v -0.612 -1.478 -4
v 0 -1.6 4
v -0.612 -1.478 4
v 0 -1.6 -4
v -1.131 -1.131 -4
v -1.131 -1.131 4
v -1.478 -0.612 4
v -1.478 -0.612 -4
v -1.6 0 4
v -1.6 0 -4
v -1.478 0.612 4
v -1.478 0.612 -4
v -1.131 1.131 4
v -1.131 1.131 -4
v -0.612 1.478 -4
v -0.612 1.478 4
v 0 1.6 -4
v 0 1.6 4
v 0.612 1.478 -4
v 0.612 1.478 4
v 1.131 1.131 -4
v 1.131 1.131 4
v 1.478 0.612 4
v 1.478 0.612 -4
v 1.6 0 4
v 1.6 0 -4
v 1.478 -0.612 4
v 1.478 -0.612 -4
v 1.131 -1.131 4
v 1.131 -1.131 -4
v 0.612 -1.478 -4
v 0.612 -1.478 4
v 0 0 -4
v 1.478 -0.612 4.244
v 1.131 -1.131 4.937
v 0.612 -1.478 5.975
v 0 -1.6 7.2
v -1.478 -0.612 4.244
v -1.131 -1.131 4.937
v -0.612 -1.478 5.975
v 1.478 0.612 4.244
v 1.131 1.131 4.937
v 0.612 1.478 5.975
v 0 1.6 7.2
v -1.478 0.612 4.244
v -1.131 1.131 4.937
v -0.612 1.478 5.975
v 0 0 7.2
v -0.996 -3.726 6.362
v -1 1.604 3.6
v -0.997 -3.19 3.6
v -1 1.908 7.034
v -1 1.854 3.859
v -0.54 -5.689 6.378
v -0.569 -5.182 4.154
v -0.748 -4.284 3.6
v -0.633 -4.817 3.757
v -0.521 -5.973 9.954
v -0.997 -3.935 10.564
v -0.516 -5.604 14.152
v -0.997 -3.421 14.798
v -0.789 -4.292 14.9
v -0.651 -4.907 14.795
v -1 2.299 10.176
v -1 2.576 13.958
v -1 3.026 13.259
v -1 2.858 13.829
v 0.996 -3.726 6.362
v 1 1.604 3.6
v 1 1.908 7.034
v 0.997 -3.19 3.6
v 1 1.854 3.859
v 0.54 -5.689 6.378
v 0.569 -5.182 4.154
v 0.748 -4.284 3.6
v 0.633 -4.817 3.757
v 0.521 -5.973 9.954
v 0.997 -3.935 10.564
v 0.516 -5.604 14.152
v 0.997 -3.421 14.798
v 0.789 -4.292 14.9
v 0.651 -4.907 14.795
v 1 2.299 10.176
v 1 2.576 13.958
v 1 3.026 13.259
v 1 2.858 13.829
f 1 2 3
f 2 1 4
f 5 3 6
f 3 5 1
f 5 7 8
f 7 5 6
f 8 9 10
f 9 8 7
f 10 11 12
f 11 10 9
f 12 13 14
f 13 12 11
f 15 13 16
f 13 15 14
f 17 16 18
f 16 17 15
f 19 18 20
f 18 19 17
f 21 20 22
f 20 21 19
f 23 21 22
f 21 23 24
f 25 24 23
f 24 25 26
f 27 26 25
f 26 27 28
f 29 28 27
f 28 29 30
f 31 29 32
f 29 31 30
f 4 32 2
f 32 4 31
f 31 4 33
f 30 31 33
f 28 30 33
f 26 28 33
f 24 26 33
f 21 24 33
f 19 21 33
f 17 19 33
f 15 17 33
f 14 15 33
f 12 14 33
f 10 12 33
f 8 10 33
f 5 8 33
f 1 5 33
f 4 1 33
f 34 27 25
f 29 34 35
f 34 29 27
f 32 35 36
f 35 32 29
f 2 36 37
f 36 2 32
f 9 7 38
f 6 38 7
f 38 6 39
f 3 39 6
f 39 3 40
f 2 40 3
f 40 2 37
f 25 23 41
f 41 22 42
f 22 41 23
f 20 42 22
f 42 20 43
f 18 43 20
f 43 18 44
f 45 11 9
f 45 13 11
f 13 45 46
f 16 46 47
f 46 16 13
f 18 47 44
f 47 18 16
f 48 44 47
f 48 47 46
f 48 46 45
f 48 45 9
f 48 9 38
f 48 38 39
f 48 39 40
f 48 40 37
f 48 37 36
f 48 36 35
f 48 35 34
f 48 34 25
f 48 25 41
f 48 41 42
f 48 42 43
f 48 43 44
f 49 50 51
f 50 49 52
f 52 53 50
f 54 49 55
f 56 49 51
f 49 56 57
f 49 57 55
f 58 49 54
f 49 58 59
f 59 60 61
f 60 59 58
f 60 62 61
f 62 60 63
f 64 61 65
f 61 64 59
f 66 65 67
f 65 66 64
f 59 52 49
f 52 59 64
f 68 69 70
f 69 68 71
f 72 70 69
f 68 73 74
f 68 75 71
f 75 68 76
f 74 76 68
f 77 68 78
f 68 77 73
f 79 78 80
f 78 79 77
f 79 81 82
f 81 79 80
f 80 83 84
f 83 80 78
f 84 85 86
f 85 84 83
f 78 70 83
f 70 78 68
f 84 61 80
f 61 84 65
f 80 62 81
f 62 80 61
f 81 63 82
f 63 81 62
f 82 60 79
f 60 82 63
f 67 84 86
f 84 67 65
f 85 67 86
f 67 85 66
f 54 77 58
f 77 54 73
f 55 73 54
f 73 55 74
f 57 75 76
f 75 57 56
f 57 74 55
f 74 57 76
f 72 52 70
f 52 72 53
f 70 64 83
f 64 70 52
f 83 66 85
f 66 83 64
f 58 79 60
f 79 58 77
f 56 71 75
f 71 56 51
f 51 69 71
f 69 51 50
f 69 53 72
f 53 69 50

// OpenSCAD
// file: ../p/4-4edge.scad
use <../lib.scad>
function ldraw_lib__4_4edge() = [
// 0 Circle 1.0
// 0 Name: 4-4edge.dat
// 0 Author: James Jessiman
// 0 !LDRAW_ORG Primitive UPDATE 2017-01
// 0 !LICENSE Licensed under CC BY 2.0 and CC BY 4.0 : see CAreadme.txt
// 
// 0 BFC CERTIFY CCW
  [0,"BFC","CERTIFY"],
  [0,"BFC","CCW"],
// 
// 0 !HISTORY 1998-12-15 [PTadmin] Official Update 1998-10
// 0 !HISTORY 2005-12-28 [PTadmin] Official Update 2005-01
// 0 !HISTORY 2007-06-24 [PTadmin] Header formatted for Contributor Agreement
// 0 !HISTORY 2008-07-01 [PTadmin] Official Update 2008-01
// 0 !HISTORY 2017-01-15 [Steffen] BFCed
// 0 !HISTORY 2017-12-30 [PTadmin] Official Update 2017-01
// 
// 
// 2 24 1 0 0 0.9239 0 0.3827
  [2,24,1,0,0,0.9239,0,0.3827],
// 2 24 0.9239 0 0.3827 0.7071 0 0.7071
  [2,24,0.9239,0,0.3827,0.7071,0,0.7071],
// 2 24 0.7071 0 0.7071 0.3827 0 0.9239
  [2,24,0.7071,0,0.7071,0.3827,0,0.9239],
// 2 24 0.3827 0 0.9239 0 0 1
  [2,24,0.3827,0,0.9239,0,0,1],
// 2 24 0 0 1 -0.3827 0 0.9239
  [2,24,0,0,1,-0.3827,0,0.9239],
// 2 24 -0.3827 0 0.9239 -0.7071 0 0.7071
  [2,24,-0.3827,0,0.9239,-0.7071,0,0.7071],
// 2 24 -0.7071 0 0.7071 -0.9239 0 0.3827
  [2,24,-0.7071,0,0.7071,-0.9239,0,0.3827],
// 2 24 -0.9239 0 0.3827 -1 0 -0
  [2,24,-0.9239,0,0.3827,-1,0,-0],
// 2 24 -1 0 -0 -0.9239 0 -0.3827
  [2,24,-1,0,-0,-0.9239,0,-0.3827],
// 2 24 -0.9239 0 -0.3827 -0.7071 0 -0.7071
  [2,24,-0.9239,0,-0.3827,-0.7071,0,-0.7071],
// 2 24 -0.7071 0 -0.7071 -0.3827 0 -0.9239
  [2,24,-0.7071,0,-0.7071,-0.3827,0,-0.9239],
// 2 24 -0.3827 0 -0.9239 0 0 -1
  [2,24,-0.3827,0,-0.9239,0,0,-1],
// 2 24 0 0 -1 0.3827 0 -0.9239
  [2,24,0,0,-1,0.3827,0,-0.9239],
// 2 24 0.3827 0 -0.9239 0.7071 0 -0.7071
  [2,24,0.3827,0,-0.9239,0.7071,0,-0.7071],
// 2 24 0.7071 0 -0.7071 0.9239 0 -0.3827
  [2,24,0.7071,0,-0.7071,0.9239,0,-0.3827],
// 2 24 0.9239 0 -0.3827 1 0 0
  [2,24,0.9239,0,-0.3827,1,0,0],
];
makepoly(ldraw_lib__4_4edge(), line=0.2);
// file: ../p/4-4disc.scad
use <../lib.scad>
function ldraw_lib__4_4disc() = [
// 0 Disc 1.0
// 0 Name: 4-4disc.dat
// 0 Author: James Jessiman
// 0 !LDRAW_ORG Primitive UPDATE 2002-02
// 0 !LICENSE Licensed under CC BY 2.0 and CC BY 4.0 : see CAreadme.txt
// 
// 0 BFC CERTIFY CCW
  [0,"BFC","CERTIFY"],
  [0,"BFC","CCW"],
// 
// 0 !HISTORY 1998-12-15 [PTadmin] Official Update 1998-10
// 0 !HISTORY 2002-03-23 [sbliss] Added BFC statement
// 0 !HISTORY 2002-04-25 [PTadmin] Official Update 2002-02
// 0 !HISTORY 2007-06-24 [PTadmin] Header formatted for Contributor Agreement
// 0 !HISTORY 2008-07-01 [PTadmin] Official Update 2008-01
// 
// 
// 3 16 0 0 0 1 0 0 0.9239 0 0.3827
  [3,16,0,0,0,1,0,0,0.9239,0,0.3827],
// 3 16 0 0 0 0.9239 0 0.3827 0.7071 0 0.7071
  [3,16,0,0,0,0.9239,0,0.3827,0.7071,0,0.7071],
// 3 16 0 0 0 0.7071 0 0.7071 0.3827 0 0.9239
  [3,16,0,0,0,0.7071,0,0.7071,0.3827,0,0.9239],
// 3 16 0 0 0 0.3827 0 0.9239 0 0 1
  [3,16,0,0,0,0.3827,0,0.9239,0,0,1],
// 3 16 0 0 0 0 0 1 -0.3827 0 0.9239
  [3,16,0,0,0,0,0,1,-0.3827,0,0.9239],
// 3 16 0 0 0 -0.3827 0 0.9239 -0.7071 0 0.7071
  [3,16,0,0,0,-0.3827,0,0.9239,-0.7071,0,0.7071],
// 3 16 0 0 0 -0.7071 0 0.7071 -0.9239 0 0.3827
  [3,16,0,0,0,-0.7071,0,0.7071,-0.9239,0,0.3827],
// 3 16 0 0 0 -0.9239 0 0.3827 -1 0 -0
  [3,16,0,0,0,-0.9239,0,0.3827,-1,0,-0],
// 3 16 0 0 0 -1 0 -0 -0.9239 0 -0.3827
  [3,16,0,0,0,-1,0,-0,-0.9239,0,-0.3827],
// 3 16 0 0 0 -0.9239 0 -0.3827 -0.7071 0 -0.7071
  [3,16,0,0,0,-0.9239,0,-0.3827,-0.7071,0,-0.7071],
// 3 16 0 0 0 -0.7071 0 -0.7071 -0.3827 0 -0.9239
  [3,16,0,0,0,-0.7071,0,-0.7071,-0.3827,0,-0.9239],
// 3 16 0 0 0 -0.3827 0 -0.9239 0 0 -1
  [3,16,0,0,0,-0.3827,0,-0.9239,0,0,-1],
// 3 16 0 0 0 0 0 -1 0.3827 0 -0.9239
  [3,16,0,0,0,0,0,-1,0.3827,0,-0.9239],
// 3 16 0 0 0 0.3827 0 -0.9239 0.7071 0 -0.7071
  [3,16,0,0,0,0.3827,0,-0.9239,0.7071,0,-0.7071],
// 3 16 0 0 0 0.7071 0 -0.7071 0.9239 0 -0.3827
  [3,16,0,0,0,0.7071,0,-0.7071,0.9239,0,-0.3827],
// 3 16 0 0 0 0.9239 0 -0.3827 1 0 0
  [3,16,0,0,0,0.9239,0,-0.3827,1,0,0],
// 0
];
makepoly(ldraw_lib__4_4disc(), line=0.2);
// file: ../p/4-4cyli.scad
use <../lib.scad>
function ldraw_lib__4_4cyli() = [
// 0 Cylinder 1.0
// 0 Name: 4-4cyli.dat
// 0 Author: James Jessiman
// 0 !LDRAW_ORG Primitive UPDATE 2005-01
// 0 !LICENSE Licensed under CC BY 2.0 and CC BY 4.0 : see CAreadme.txt
// 
// 0 BFC CERTIFY CCW
  [0,"BFC","CERTIFY"],
  [0,"BFC","CCW"],
// 
// 0 !HISTORY 1998-12-15 [PTadmin] Official Update 1998-10
// 0 !HISTORY 2002-03-23 [sbliss] Added BFC statement; merged headers from files in distributions LDraw 0.27 and Complete.
// 0 !HISTORY 2002-04-25 [PTadmin] Official Update 2002-02
// 0 !HISTORY 2004-12-14 [guyvivan] BFC CCW
// 0 !HISTORY 2005-12-28 [PTadmin] Official Update 2005-01
// 0 !HISTORY 2007-06-24 [PTadmin] Header formatted for Contributor Agreement
// 0 !HISTORY 2008-07-01 [PTadmin] Official Update 2008-01
// 
// 
// 4 16 1 1 0 0.9239 1 0.3827 0.9239 0 0.3827 1 0 0
  [4,16,1,1,0,0.9239,1,0.3827,0.9239,0,0.3827,1,0,0],
// 5 24 1 0 0 1 1 0 0.9239 0 0.3827 0.9239 0 -0.3827
  [5,24,1,0,0,1,1,0,0.9239,0,0.3827,0.9239,0,-0.3827],
// 4 16 0.9239 1 0.3827 0.7071 1 0.7071 0.7071 0 0.7071 0.9239 0 0.3827
  [4,16,0.9239,1,0.3827,0.7071,1,0.7071,0.7071,0,0.7071,0.9239,0,0.3827],
// 5 24 0.9239 0 0.3827 0.9239 1 0.3827 0.7071 0 0.7071 1 0 0
  [5,24,0.9239,0,0.3827,0.9239,1,0.3827,0.7071,0,0.7071,1,0,0],
// 4 16 0.7071 1 0.7071 0.3827 1 0.9239 0.3827 0 0.9239 0.7071 0 0.7071
  [4,16,0.7071,1,0.7071,0.3827,1,0.9239,0.3827,0,0.9239,0.7071,0,0.7071],
// 5 24 0.7071 0 0.7071 0.7071 1 0.7071 0.3827 0 0.9239 0.9239 0 0.3827
  [5,24,0.7071,0,0.7071,0.7071,1,0.7071,0.3827,0,0.9239,0.9239,0,0.3827],
// 4 16 0.3827 1 0.9239 0 1 1 0 0 1 0.3827 0 0.9239
  [4,16,0.3827,1,0.9239,0,1,1,0,0,1,0.3827,0,0.9239],
// 5 24 0.3827 0 0.9239 0.3827 1 0.9239 0 0 1 0.7071 0 0.7071
  [5,24,0.3827,0,0.9239,0.3827,1,0.9239,0,0,1,0.7071,0,0.7071],
// 4 16 0 1 1 -0.3827 1 0.9239 -0.3827 0 0.9239 0 0 1
  [4,16,0,1,1,-0.3827,1,0.9239,-0.3827,0,0.9239,0,0,1],
// 5 24 0 0 1 0 1 1 -0.3827 0 0.9239 0.3827 0 0.9239
  [5,24,0,0,1,0,1,1,-0.3827,0,0.9239,0.3827,0,0.9239],
// 4 16 -0.3827 1 0.9239 -0.7071 1 0.7071 -0.7071 0 0.7071 -0.3827 0 0.9239
  [4,16,-0.3827,1,0.9239,-0.7071,1,0.7071,-0.7071,0,0.7071,-0.3827,0,0.9239],
// 5 24 -0.3827 0 0.9239 -0.3827 1 0.9239 -0.7071 0 0.7071 0 0 1
  [5,24,-0.3827,0,0.9239,-0.3827,1,0.9239,-0.7071,0,0.7071,0,0,1],
// 4 16 -0.7071 1 0.7071 -0.9239 1 0.3827 -0.9239 0 0.3827 -0.7071 0 0.7071
  [4,16,-0.7071,1,0.7071,-0.9239,1,0.3827,-0.9239,0,0.3827,-0.7071,0,0.7071],
// 5 24 -0.7071 0 0.7071 -0.7071 1 0.7071 -0.9239 0 0.3827 -0.3827 0 0.9239
  [5,24,-0.7071,0,0.7071,-0.7071,1,0.7071,-0.9239,0,0.3827,-0.3827,0,0.9239],
// 4 16 -0.9239 1 0.3827 -1 1 0 -1 0 0 -0.9239 0 0.3827
  [4,16,-0.9239,1,0.3827,-1,1,0,-1,0,0,-0.9239,0,0.3827],
// 5 24 -0.9239 0 0.3827 -0.9239 1 0.3827 -1 0 0 -0.7071 0 0.7071
  [5,24,-0.9239,0,0.3827,-0.9239,1,0.3827,-1,0,0,-0.7071,0,0.7071],
// 4 16 -1 1 0 -0.9239 1 -0.3827 -0.9239 0 -0.3827 -1 0 0
  [4,16,-1,1,0,-0.9239,1,-0.3827,-0.9239,0,-0.3827,-1,0,0],
// 5 24 -1 0 0 -1 1 0 -0.9239 0 -0.3827 -0.9239 0 0.3827
  [5,24,-1,0,0,-1,1,0,-0.9239,0,-0.3827,-0.9239,0,0.3827],
// 4 16 -0.9239 1 -0.3827 -0.7071 1 -0.7071 -0.7071 0 -0.7071 -0.9239 0 -0.3827
  [4,16,-0.9239,1,-0.3827,-0.7071,1,-0.7071,-0.7071,0,-0.7071,-0.9239,0,-0.3827],
// 5 24 -0.9239 0 -0.3827 -0.9239 1 -0.3827 -0.7071 0 -0.7071 -1 0 0
  [5,24,-0.9239,0,-0.3827,-0.9239,1,-0.3827,-0.7071,0,-0.7071,-1,0,0],
// 4 16 -0.7071 1 -0.7071 -0.3827 1 -0.9239 -0.3827 0 -0.9239 -0.7071 0 -0.7071
  [4,16,-0.7071,1,-0.7071,-0.3827,1,-0.9239,-0.3827,0,-0.9239,-0.7071,0,-0.7071],
// 5 24 -0.7071 0 -0.7071 -0.7071 1 -0.7071 -0.3827 0 -0.9239 -0.9239 0 -0.3827
  [5,24,-0.7071,0,-0.7071,-0.7071,1,-0.7071,-0.3827,0,-0.9239,-0.9239,0,-0.3827],
// 4 16 -0.3827 1 -0.9239 0 1 -1 0 0 -1 -0.3827 0 -0.9239
  [4,16,-0.3827,1,-0.9239,0,1,-1,0,0,-1,-0.3827,0,-0.9239],
// 5 24 -0.3827 0 -0.9239 -0.3827 1 -0.9239 0 0 -1 -0.7071 0 -0.7071
  [5,24,-0.3827,0,-0.9239,-0.3827,1,-0.9239,0,0,-1,-0.7071,0,-0.7071],
// 4 16 0 1 -1 0.3827 1 -0.9239 0.3827 0 -0.9239 0 0 -1
  [4,16,0,1,-1,0.3827,1,-0.9239,0.3827,0,-0.9239,0,0,-1],
// 5 24 0 0 -1 0 1 -1 0.3827 0 -0.9239 -0.3827 0 -0.9239
  [5,24,0,0,-1,0,1,-1,0.3827,0,-0.9239,-0.3827,0,-0.9239],
// 4 16 0.3827 1 -0.9239 0.7071 1 -0.7071 0.7071 0 -0.7071 0.3827 0 -0.9239
  [4,16,0.3827,1,-0.9239,0.7071,1,-0.7071,0.7071,0,-0.7071,0.3827,0,-0.9239],
// 5 24 0.3827 0 -0.9239 0.3827 1 -0.9239 0.7071 0 -0.7071 0 0 -1
  [5,24,0.3827,0,-0.9239,0.3827,1,-0.9239,0.7071,0,-0.7071,0,0,-1],
// 4 16 0.7071 1 -0.7071 0.9239 1 -0.3827 0.9239 0 -0.3827 0.7071 0 -0.7071
  [4,16,0.7071,1,-0.7071,0.9239,1,-0.3827,0.9239,0,-0.3827,0.7071,0,-0.7071],
// 5 24 0.7071 0 -0.7071 0.7071 1 -0.7071 0.9239 0 -0.3827 0.3827 0 -0.9239
  [5,24,0.7071,0,-0.7071,0.7071,1,-0.7071,0.9239,0,-0.3827,0.3827,0,-0.9239],
// 4 16 0.9239 1 -0.3827 1 1 0 1 0 0 0.9239 0 -0.3827
  [4,16,0.9239,1,-0.3827,1,1,0,1,0,0,0.9239,0,-0.3827],
// 5 24 0.9239 0 -0.3827 0.9239 1 -0.3827 1 0 0 0.7071 0 -0.7071
  [5,24,0.9239,0,-0.3827,0.9239,1,-0.3827,1,0,0,0.7071,0,-0.7071],
// 0
];
makepoly(ldraw_lib__4_4cyli(), line=0.2);
// file: ../p/2-4edge.scad
use <../lib.scad>
function ldraw_lib__2_4edge() = [
// 0 Circle 0.5
// 0 Name: 2-4edge.dat
// 0 Author: James Jessiman
// 0 !LDRAW_ORG Primitive UPDATE 2017-01
// 0 !LICENSE Licensed under CC BY 2.0 and CC BY 4.0 : see CAreadme.txt
// 
// 0 BFC CERTIFY CCW
  [0,"BFC","CERTIFY"],
  [0,"BFC","CCW"],
// 
// 0 !HISTORY 2007-06-24 [PTadmin] Header formatted for Contributor Agreement
// 0 !HISTORY 2008-07-01 [PTadmin] Official Update 2008-01
// 0 !HISTORY 2017-01-15 [Steffen] BFCed
// 0 !HISTORY 2017-12-30 [PTadmin] Official Update 2017-01
// 
// 
// 2 24 1 0 0 0.9239 0 0.3827
  [2,24,1,0,0,0.9239,0,0.3827],
// 2 24 0.9239 0 0.3827 0.7071 0 0.7071
  [2,24,0.9239,0,0.3827,0.7071,0,0.7071],
// 2 24 0.7071 0 0.7071 0.3827 0 0.9239
  [2,24,0.7071,0,0.7071,0.3827,0,0.9239],
// 2 24 0.3827 0 0.9239 0 0 1
  [2,24,0.3827,0,0.9239,0,0,1],
// 2 24 0 0 1 -0.3827 0 0.9239
  [2,24,0,0,1,-0.3827,0,0.9239],
// 2 24 -0.3827 0 0.9239 -0.7071 0 0.7071
  [2,24,-0.3827,0,0.9239,-0.7071,0,0.7071],
// 2 24 -0.7071 0 0.7071 -0.9239 0 0.3827
  [2,24,-0.7071,0,0.7071,-0.9239,0,0.3827],
// 2 24 -0.9239 0 0.3827 -1 0 0
  [2,24,-0.9239,0,0.3827,-1,0,0],
];
makepoly(ldraw_lib__2_4edge(), line=0.2);
// file: ../p/2-4disc.scad
use <../lib.scad>
function ldraw_lib__2_4disc() = [
// 0 Disc 0.5
// 0 Name: 2-4disc.dat
// 0 Author: James Jessiman
// 0 !LDRAW_ORG Primitive UPDATE 2002-02
// 0 !LICENSE Licensed under CC BY 2.0 and CC BY 4.0 : see CAreadme.txt
// 
// 0 BFC CERTIFY CCW
  [0,"BFC","CERTIFY"],
  [0,"BFC","CCW"],
// 
// 0 !HISTORY 1998-12-15 [PTadmin] Official Update 1998-10
// 0 !HISTORY 2002-03-23 [sbliss] Added BFC statement
// 0 !HISTORY 2002-04-25 [PTadmin] Official Update 2002-02
// 0 !HISTORY 2007-06-24 [PTadmin] Header formatted for Contributor Agreement
// 0 !HISTORY 2008-07-01 [PTadmin] Official Update 2008-01
// 
// 
// 3 16 0 0 0 1 0 0 0.9239 0 0.3827
  [3,16,0,0,0,1,0,0,0.9239,0,0.3827],
// 3 16 0 0 0 0.9239 0 0.3827 0.7071 0 0.7071
  [3,16,0,0,0,0.9239,0,0.3827,0.7071,0,0.7071],
// 3 16 0 0 0 0.7071 0 0.7071 0.3827 0 0.9239
  [3,16,0,0,0,0.7071,0,0.7071,0.3827,0,0.9239],
// 3 16 0 0 0 0.3827 0 0.9239 0 0 1
  [3,16,0,0,0,0.3827,0,0.9239,0,0,1],
// 3 16 0 0 0 0 0 1 -0.3827 0 0.9239
  [3,16,0,0,0,0,0,1,-0.3827,0,0.9239],
// 3 16 0 0 0 -0.3827 0 0.9239 -0.7071 0 0.7071
  [3,16,0,0,0,-0.3827,0,0.9239,-0.7071,0,0.7071],
// 3 16 0 0 0 -0.7071 0 0.7071 -0.9239 0 0.3827
  [3,16,0,0,0,-0.7071,0,0.7071,-0.9239,0,0.3827],
// 3 16 0 0 0 -0.9239 0 0.3827 -1 0 -0
  [3,16,0,0,0,-0.9239,0,0.3827,-1,0,-0],
// 0
];
makepoly(ldraw_lib__2_4disc(), line=0.2);
// file: ../p/1-4cyls.scad
use <../lib.scad>
function ldraw_lib__1_4cyls() = [
// 0 Cylinder Sloped 0.25
// 0 Name: 1-4cyls.dat
// 0 Author: James Jessiman
// 0 !LDRAW_ORG Primitive UPDATE 2012-01
// 0 !LICENSE Licensed under CC BY 2.0 and CC BY 4.0 : see CAreadme.txt
// 
// 0 BFC CERTIFY CCW
  [0,"BFC","CERTIFY"],
  [0,"BFC","CCW"],
// 
// 0 !HISTORY 1998-12-15 [PTadmin] Official Update 1998-10
// 0 !HISTORY 2002-07-03 [sbliss] Added BFC statement
// 0 !HISTORY 2002-08-18 [PTadmin] Official Update 2002-04
// 0 !HISTORY 2007-06-22 [PTadmin] Header formatted for Contributor Agreement
// 0 !HISTORY 2008-07-01 [PTadmin] Official Update 2008-01
// 0 !HISTORY 2012-02-16 [Philo] Changed to CCW
// 0 !HISTORY 2012-03-30 [PTadmin] Official Update 2012-01
// 
// 
// 3 16 0.9239 0.0761 0.3827 0.9239 0 0.3827 1 0 0
  [3,16,0.9239,0.0761,0.3827,0.9239,0,0.3827,1,0,0],
// 4 16 0.9239 0.0761 0.3827 0.7071 0.2929 0.7071 0.7071 0 0.7071 0.9239 0 0.3827
  [4,16,0.9239,0.0761,0.3827,0.7071,0.2929,0.7071,0.7071,0,0.7071,0.9239,0,0.3827],
// 4 16 0.7071 0.2929 0.7071 0.3827 0.6173 0.9239 0.3827 0 0.9239 0.7071 0 0.7071
  [4,16,0.7071,0.2929,0.7071,0.3827,0.6173,0.9239,0.3827,0,0.9239,0.7071,0,0.7071],
// 4 16 0.3827 0.6173 0.9239 0 1 1 0 0 1 0.3827 0 0.9239
  [4,16,0.3827,0.6173,0.9239,0,1,1,0,0,1,0.3827,0,0.9239],
// 
// 5 24 0.9239 0 0.3827 0.9239 0.0761 0.3827 0.7071 0 0.7071 1 0 0
  [5,24,0.9239,0,0.3827,0.9239,0.0761,0.3827,0.7071,0,0.7071,1,0,0],
// 5 24 0.7071 0 0.7071 0.7071 0.2929 0.7071 0.3827 0 0.9239 0.9239 0 0.3827
  [5,24,0.7071,0,0.7071,0.7071,0.2929,0.7071,0.3827,0,0.9239,0.9239,0,0.3827],
// 5 24 0.3827 0 0.9239 0.3827 0.6173 0.9239 0 0 1 0.7071 0 0.7071
  [5,24,0.3827,0,0.9239,0.3827,0.6173,0.9239,0,0,1,0.7071,0,0.7071],
// 5 24 0 0 1 0 1 1 0.3827 0 0.9239 -1 0 1
  [5,24,0,0,1,0,1,1,0.3827,0,0.9239,-1,0,1],
];
makepoly(ldraw_lib__1_4cyls(), line=0.2);
// main file
use <../lib.scad>
use <../p/1-4cyls.scad>
use <../p/2-4disc.scad>
use <../p/2-4edge.scad>
use <../p/4-4cyli.scad>
use <../p/4-4disc.scad>
use <../p/4-4edge.scad>
function ldraw_lib__98369() = [
// 0 Minifig Cleaver
// 0 Name: 98369.dat
// 0 Author: Evert-Jan Boer [ejboer]
// 0 !LDRAW_ORG Part UPDATE 2017-01
// 0 !LICENSE Licensed under CC BY 2.0 and CC BY 4.0 : see CAreadme.txt
// 
// 0 BFC CERTIFY CCW
  [0,"BFC","CERTIFY"],
  [0,"BFC","CCW"],
// 
// 0 !CATEGORY Minifig Accessory
// 0 !KEYWORDS butcher, Knife
// 
// 0 !HISTORY 2013-08-14 {LEGO Digital Designer} Original part shape
// 0 !HISTORY 2017-07-03 [ejboer] File preparation for LDraw Parts Tracker
// 0 !HISTORY 2017-12-30 [PTadmin] Official Update 2017-01
// 
// 
// 1 16 0 10 0 0 0 -4 0 -20 0 -4 0 0 4-4cyli.dat
  [1,16,0,10,0,0,0,-4,0,-20,0,-4,0,0, ldraw_lib__4_4cyli()],
// 1 16 0 10 0 0 0 4 0 -1 0 -4 0 0 4-4disc.dat
  [1,16,0,10,0,0,0,4,0,-1,0,-4,0,0, ldraw_lib__4_4disc()],
// 1 16 0 10 0 0 0 -4 0 1 0 -4 0 0 4-4edge.dat
  [1,16,0,10,0,0,0,-4,0,1,0,-4,0,0, ldraw_lib__4_4edge()],
// 1 16 0 -10 0 4 0 0 0 -8 0 0 0 -4 1-4cyls.dat
  [1,16,0,-10,0,4,0,0,0,-8,0,0,0,-4, ldraw_lib__1_4cyls()],
// 1 16 0 -10 0 -4 0 0 0 -8 0 0 0 -4 1-4cyls.dat
  [1,16,0,-10,0,-4,0,0,0,-8,0,0,0,-4, ldraw_lib__1_4cyls()],
// 1 16 0 -10 0 4 0 0 0 -8 0 0 0 4 1-4cyls.dat
  [1,16,0,-10,0,4,0,0,0,-8,0,0,0,4, ldraw_lib__1_4cyls()],
// 1 16 0 -10 0 -4 0 0 0 -8 0 0 0 4 1-4cyls.dat
  [1,16,0,-10,0,-4,0,0,0,-8,0,0,0,4, ldraw_lib__1_4cyls()],
// 1 16 0 -18 0 0 0 -4 0 1 8 4 0 0 2-4disc.dat
  [1,16,0,-18,0,0,0,-4,0,1,8,4,0,0, ldraw_lib__2_4disc()],
// 1 16 0 -18 0 0 0 4 0 1 8 -4 0 0 2-4disc.dat
  [1,16,0,-18,0,0,0,4,0,1,8,-4,0,0, ldraw_lib__2_4disc()],
// 1 16 0 -18 0 0 0 4 0 1 8 -4 0 0 2-4edge.dat
  [1,16,0,-18,0,0,0,4,0,1,8,-4,0,0, ldraw_lib__2_4edge()],
// 1 16 0 -18 0 0 0 -4 0 1 8 4 0 0 2-4edge.dat
  [1,16,0,-18,0,0,0,-4,0,1,8,4,0,0, ldraw_lib__2_4edge()],
// 
// 4 16 -2.493 -9 -7.974 -2.491 -15.904 -9.316 -2.5 -17.585 4.77 -2.5 -9 4.01
  [4,16,-2.493,-9,-7.974,-2.491,-15.904,-9.316,-2.5,-17.585,4.77,-2.5,-9,4.01],
// 3 16 -2.5 -17.585 4.77 -2.5 -9.647 4.634 -2.5 -9 4.01
  [3,16,-2.5,-17.585,4.77,-2.5,-9.647,4.634,-2.5,-9,4.01],
// 3 16 -1.35 -15.945 -14.223 -2.491 -15.904 -9.316 -1.423 -10.386 -12.955
  [3,16,-1.35,-15.945,-14.223,-2.491,-15.904,-9.316,-1.423,-10.386,-12.955],
// 4 16 -2.491 -15.904 -9.316 -2.493 -9 -7.974 -1.869 -9 -10.709 -1.582 -9.392 -12.042
  [4,16,-2.491,-15.904,-9.316,-2.493,-9,-7.974,-1.869,-9,-10.709,-1.582,-9.392,-12.042],
// 3 16 -2.491 -15.904 -9.316 -1.582 -9.392 -12.042 -1.423 -10.386 -12.955
  [3,16,-2.491,-15.904,-9.316,-1.582,-9.392,-12.042,-1.423,-10.386,-12.955],
// 4 16 -2.492 -26.41 -9.838 -2.491 -15.904 -9.316 -1.35 -15.945 -14.223 -1.303 -24.884 -14.933
  [4,16,-2.492,-26.41,-9.838,-2.491,-15.904,-9.316,-1.35,-15.945,-14.223,-1.303,-24.884,-14.933],
// 4 16 -2.492 -36.994 -8.552 -2.492 -26.41 -9.838 -1.303 -24.884 -14.933 -1.29 -35.381 -14.011
  [4,16,-2.492,-36.994,-8.552,-2.492,-26.41,-9.838,-1.303,-24.884,-14.933,-1.29,-35.381,-14.011],
// 4 16 -1.627 -36.988 -12.268 -1.973 -37.25 -10.731 -2.492 -36.994 -8.552 -1.29 -35.381 -14.011
  [4,16,-1.627,-36.988,-12.268,-1.973,-37.25,-10.731,-2.492,-36.994,-8.552,-1.29,-35.381,-14.011],
// 4 16 -2.492 -26.41 -9.838 -2.492 -36.994 -8.552 -2.5 -34.894 6.439 -2.5 -25.441 5.748
  [4,16,-2.492,-26.41,-9.838,-2.492,-36.994,-8.552,-2.5,-34.894,6.439,-2.5,-25.441,5.748],
// 4 16 -2.5 -34.894 6.439 -2.5 -34.573 7.144 -2.5 -33.148 7.564 -2.5 -25.441 5.748
  [4,16,-2.5,-34.894,6.439,-2.5,-34.573,7.144,-2.5,-33.148,7.564,-2.5,-25.441,5.748],
// 4 16 -2.491 -15.904 -9.316 -2.492 -26.41 -9.838 -2.5 -25.441 5.748 -2.5 -17.585 4.77
  [4,16,-2.491,-15.904,-9.316,-2.492,-26.41,-9.838,-2.5,-25.441,5.748,-2.5,-17.585,4.77],
// 4 16 2.5 -17.585 4.77 2.491 -15.904 -9.316 2.493 -9 -7.974 2.5 -9 4.01
  [4,16,2.5,-17.585,4.77,2.491,-15.904,-9.316,2.493,-9,-7.974,2.5,-9,4.01],
// 3 16 2.5 -9.647 4.634 2.5 -17.585 4.77 2.5 -9 4.01
  [3,16,2.5,-9.647,4.634,2.5,-17.585,4.77,2.5,-9,4.01],
// 3 16 2.491 -15.904 -9.316 1.35 -15.945 -14.223 1.423 -10.386 -12.955
  [3,16,2.491,-15.904,-9.316,1.35,-15.945,-14.223,1.423,-10.386,-12.955],
// 4 16 1.869 -9 -10.709 2.493 -9 -7.974 2.491 -15.904 -9.316 1.582 -9.392 -12.042
  [4,16,1.869,-9,-10.709,2.493,-9,-7.974,2.491,-15.904,-9.316,1.582,-9.392,-12.042],
// 3 16 1.423 -10.386 -12.955 1.582 -9.392 -12.042 2.491 -15.904 -9.316
  [3,16,1.423,-10.386,-12.955,1.582,-9.392,-12.042,2.491,-15.904,-9.316],
// 4 16 1.35 -15.945 -14.223 2.491 -15.904 -9.316 2.492 -26.41 -9.838 1.303 -24.884 -14.933
  [4,16,1.35,-15.945,-14.223,2.491,-15.904,-9.316,2.492,-26.41,-9.838,1.303,-24.884,-14.933],
// 4 16 1.303 -24.884 -14.933 2.492 -26.41 -9.838 2.492 -36.994 -8.552 1.29 -35.381 -14.011
  [4,16,1.303,-24.884,-14.933,2.492,-26.41,-9.838,2.492,-36.994,-8.552,1.29,-35.381,-14.011],
// 4 16 2.492 -36.994 -8.552 1.973 -37.25 -10.731 1.627 -36.988 -12.268 1.29 -35.381 -14.011
  [4,16,2.492,-36.994,-8.552,1.973,-37.25,-10.731,1.627,-36.988,-12.268,1.29,-35.381,-14.011],
// 4 16 2.5 -34.894 6.439 2.492 -36.994 -8.552 2.492 -26.41 -9.838 2.5 -25.441 5.748
  [4,16,2.5,-34.894,6.439,2.492,-36.994,-8.552,2.492,-26.41,-9.838,2.5,-25.441,5.748],
// 4 16 2.5 -33.148 7.564 2.5 -34.573 7.144 2.5 -34.894 6.439 2.5 -25.441 5.748
  [4,16,2.5,-33.148,7.564,2.5,-34.573,7.144,2.5,-34.894,6.439,2.5,-25.441,5.748],
// 4 16 2.5 -25.441 5.748 2.492 -26.41 -9.838 2.491 -15.904 -9.316 2.5 -17.585 4.77
  [4,16,2.5,-25.441,5.748,2.492,-26.41,-9.838,2.491,-15.904,-9.316,2.5,-17.585,4.77],
// 4 16 2.5 -34.894 6.439 -2.5 -34.894 6.439 -2.492 -36.994 -8.552 2.492 -36.994 -8.552
  [4,16,2.5,-34.894,6.439,-2.5,-34.894,6.439,-2.492,-36.994,-8.552,2.492,-36.994,-8.552],
// 4 16 -1.973 -37.25 -10.731 1.973 -37.25 -10.731 2.492 -36.994 -8.552 -2.492 -36.994 -8.552
  [4,16,-1.973,-37.25,-10.731,1.973,-37.25,-10.731,2.492,-36.994,-8.552,-2.492,-36.994,-8.552],
// 4 16 -1.627 -36.988 -12.268 1.627 -36.988 -12.268 1.973 -37.25 -10.731 -1.973 -37.25 -10.731
  [4,16,-1.627,-36.988,-12.268,1.627,-36.988,-12.268,1.973,-37.25,-10.731,-1.973,-37.25,-10.731],
// 4 16 1.627 -36.988 -12.268 -1.627 -36.988 -12.268 -1.29 -35.381 -14.011 1.29 -35.381 -14.011
  [4,16,1.627,-36.988,-12.268,-1.627,-36.988,-12.268,-1.29,-35.381,-14.011,1.29,-35.381,-14.011],
// 4 16 2.5 -34.573 7.144 -2.5 -34.573 7.144 -2.5 -34.894 6.439 2.5 -34.894 6.439
  [4,16,2.5,-34.573,7.144,-2.5,-34.573,7.144,-2.5,-34.894,6.439,2.5,-34.894,6.439],
// 4 16 -2.5 -34.573 7.144 2.5 -34.573 7.144 2.5 -33.148 7.564 -2.5 -33.148 7.564
  [4,16,-2.5,-34.573,7.144,2.5,-34.573,7.144,2.5,-33.148,7.564,-2.5,-33.148,7.564],
// 4 16 -1.35 -15.945 -14.223 1.35 -15.945 -14.223 1.303 -24.884 -14.933 -1.303 -24.884 -14.933
  [4,16,-1.35,-15.945,-14.223,1.35,-15.945,-14.223,1.303,-24.884,-14.933,-1.303,-24.884,-14.933],
// 4 16 1.35 -15.945 -14.223 -1.35 -15.945 -14.223 -1.423 -10.386 -12.955 1.423 -10.386 -12.955
  [4,16,1.35,-15.945,-14.223,-1.35,-15.945,-14.223,-1.423,-10.386,-12.955,1.423,-10.386,-12.955],
// 4 16 1.582 -9.392 -12.042 -1.582 -9.392 -12.042 -1.869 -9 -10.709 1.869 -9 -10.709
  [4,16,1.582,-9.392,-12.042,-1.582,-9.392,-12.042,-1.869,-9,-10.709,1.869,-9,-10.709],
// 4 16 1.423 -10.386 -12.955 -1.423 -10.386 -12.955 -1.582 -9.392 -12.042 1.582 -9.392 -12.042
  [4,16,1.423,-10.386,-12.955,-1.423,-10.386,-12.955,-1.582,-9.392,-12.042,1.582,-9.392,-12.042],
// 4 16 -2.5 -17.585 4.77 2.5 -17.585 4.77 2.5 -9.647 4.634 -2.5 -9.647 4.634
  [4,16,-2.5,-17.585,4.77,2.5,-17.585,4.77,2.5,-9.647,4.634,-2.5,-9.647,4.634],
// 4 16 2.5 -17.585 4.77 -2.5 -17.585 4.77 -2.5 -25.441 5.748 2.5 -25.441 5.748
  [4,16,2.5,-17.585,4.77,-2.5,-17.585,4.77,-2.5,-25.441,5.748,2.5,-25.441,5.748],
// 4 16 2.5 -25.441 5.748 -2.5 -25.441 5.748 -2.5 -33.148 7.564 2.5 -33.148 7.564
  [4,16,2.5,-25.441,5.748,-2.5,-25.441,5.748,-2.5,-33.148,7.564,2.5,-33.148,7.564],
// 4 16 1.29 -35.381 -14.011 -1.29 -35.381 -14.011 -1.303 -24.884 -14.933 1.303 -24.884 -14.933
  [4,16,1.29,-35.381,-14.011,-1.29,-35.381,-14.011,-1.303,-24.884,-14.933,1.303,-24.884,-14.933],
// 4 16 -2.493 -9 -7.974 2.493 -9 -7.974 1.869 -9 -10.709 -1.869 -9 -10.709
  [4,16,-2.493,-9,-7.974,2.493,-9,-7.974,1.869,-9,-10.709,-1.869,-9,-10.709],
// 4 16 2.493 -9 -7.974 -2.493 -9 -7.974 -2.5 -9 4.01 2.5 -9 4.01
  [4,16,2.493,-9,-7.974,-2.493,-9,-7.974,-2.5,-9,4.01,2.5,-9,4.01],
// 4 16 -2.5 -9.647 4.634 2.5 -9.647 4.634 2.5 -9 4.01 -2.5 -9 4.01
  [4,16,-2.5,-9.647,4.634,2.5,-9.647,4.634,2.5,-9,4.01,-2.5,-9,4.01],
// 
// 2 24 0 -9 -4 -1.5308 -9 -3.6956
  [2,24,0,-9,-4,-1.5308,-9,-3.6956],
// 2 24 -2.49588 -9 -3.05063 -1.5308 -9 -3.6956
  [2,24,-2.49588,-9,-3.05063,-1.5308,-9,-3.6956],
// 2 24 -2.49944 -9 3.04825 -2.49923 -13.0015 3.04839
  [2,24,-2.49944,-9,3.04825,-2.49923,-13.0015,3.04839],
// 2 24 -2.49944 -9 3.04825 -1.5308 -9 3.6956
  [2,24,-2.49944,-9,3.04825,-1.5308,-9,3.6956],
// 2 24 0 -9 4 -1.5308 -9 3.6956
  [2,24,0,-9,4,-1.5308,-9,3.6956],
// 2 24 1.5308 -9 3.6956 0 -9 4
  [2,24,1.5308,-9,3.6956,0,-9,4],
// 2 24 2.49923 -13.0015 3.04839 2.49944 -9 3.04825
  [2,24,2.49923,-13.0015,3.04839,2.49944,-9,3.04825],
// 2 24 1.5308 -9 3.6956 2.49944 -9 3.04825
  [2,24,1.5308,-9,3.6956,2.49944,-9,3.04825],
// 2 24 1.5308 -9 -3.6956 2.49588 -9 -3.05063
  [2,24,1.5308,-9,-3.6956,2.49588,-9,-3.05063],
// 
// 2 24 -2.49923 -13.0015 3.04839 -2.49559 -13.0088 -3.05082
  [2,24,-2.49923,-13.0015,3.04839,-2.49559,-13.0088,-3.05082],
// 2 24 -2.49588 -9 -3.05063 -2.49559 -13.0088 -3.05082
  [2,24,-2.49588,-9,-3.05063,-2.49559,-13.0088,-3.05082],
// 2 24 1.5308 -9 -3.6956 0 -9 -4
  [2,24,1.5308,-9,-3.6956,0,-9,-4],
// 2 24 2.49559 -13.0088 -3.05082 2.49588 -9 -3.05063
  [2,24,2.49559,-13.0088,-3.05082,2.49588,-9,-3.05063],
// 2 24 2.49559 -13.0088 -3.05082 2.49923 -13.0015 3.04839
  [2,24,2.49559,-13.0088,-3.05082,2.49923,-13.0015,3.04839],
// 2 24 2.5 -9 4.01 2.49944 -9 3.04825
  [2,24,2.5,-9,4.01,2.49944,-9,3.04825],
// 2 24 2.5 -9 4.01 2.5 -9.647 4.634
  [2,24,2.5,-9,4.01,2.5,-9.647,4.634],
// 2 24 -2.5 -9 4.01 -2.49944 -9 3.04825
  [2,24,-2.5,-9,4.01,-2.49944,-9,3.04825],
// 2 24 -2.5 -9 4.01 -2.5 -9.647 4.634
  [2,24,-2.5,-9,4.01,-2.5,-9.647,4.634],
// 2 24 2.5 -9.647 4.634 -2.5 -9.647 4.634
  [2,24,2.5,-9.647,4.634,-2.5,-9.647,4.634],
// 2 24 -2.5 -9.647 4.634 -2.5 -17.585 4.77
  [2,24,-2.5,-9.647,4.634,-2.5,-17.585,4.77],
// 2 24 -2.5 -17.585 4.77 -2.5 -25.441 5.748
  [2,24,-2.5,-17.585,4.77,-2.5,-25.441,5.748],
// 2 24 2.5 -17.585 4.77 2.5 -9.647 4.634
  [2,24,2.5,-17.585,4.77,2.5,-9.647,4.634],
// 2 24 2.5 -17.585 4.77 2.5 -25.441 5.748
  [2,24,2.5,-17.585,4.77,2.5,-25.441,5.748],
// 2 24 2.5 -33.148 7.564 2.5 -25.441 5.748
  [2,24,2.5,-33.148,7.564,2.5,-25.441,5.748],
// 2 24 -2.5 -25.441 5.748 -2.5 -33.148 7.564
  [2,24,-2.5,-25.441,5.748,-2.5,-33.148,7.564],
// 2 24 2.5 -33.148 7.564 2.5 -34.573 7.144
  [2,24,2.5,-33.148,7.564,2.5,-34.573,7.144],
// 2 24 2.5 -34.573 7.144 2.5 -34.894 6.439
  [2,24,2.5,-34.573,7.144,2.5,-34.894,6.439],
// 2 24 -2.5 -33.148 7.564 -2.5 -34.573 7.144
  [2,24,-2.5,-33.148,7.564,-2.5,-34.573,7.144],
// 2 24 -2.5 -34.573 7.144 -2.5 -34.894 6.439
  [2,24,-2.5,-34.573,7.144,-2.5,-34.894,6.439],
// 2 24 -2.5 -34.894 6.439 -2.492 -36.994 -8.552
  [2,24,-2.5,-34.894,6.439,-2.492,-36.994,-8.552],
// 2 24 2.5 -34.894 6.439 2.492 -36.994 -8.552
  [2,24,2.5,-34.894,6.439,2.492,-36.994,-8.552],
// 2 24 -2.492 -36.994 -8.552 -1.973 -37.25 -10.731
  [2,24,-2.492,-36.994,-8.552,-1.973,-37.25,-10.731],
// 2 24 2.492 -36.994 -8.552 1.973 -37.25 -10.731
  [2,24,2.492,-36.994,-8.552,1.973,-37.25,-10.731],
// 2 24 -1.973 -37.25 -10.731 -1.627 -36.988 -12.268
  [2,24,-1.973,-37.25,-10.731,-1.627,-36.988,-12.268],
// 2 24 1.973 -37.25 -10.731 1.627 -36.988 -12.268
  [2,24,1.973,-37.25,-10.731,1.627,-36.988,-12.268],
// 2 24 -1.627 -36.988 -12.268 -1.29 -35.381 -14.011
  [2,24,-1.627,-36.988,-12.268,-1.29,-35.381,-14.011],
// 2 24 1.627 -36.988 -12.268 1.29 -35.381 -14.011
  [2,24,1.627,-36.988,-12.268,1.29,-35.381,-14.011],
// 2 24 -1.29 -35.381 -14.011 1.29 -35.381 -14.011
  [2,24,-1.29,-35.381,-14.011,1.29,-35.381,-14.011],
// 2 24 -1.29 -35.381 -14.011 -1.303 -24.884 -14.933
  [2,24,-1.29,-35.381,-14.011,-1.303,-24.884,-14.933],
// 2 24 1.29 -35.381 -14.011 1.303 -24.884 -14.933
  [2,24,1.29,-35.381,-14.011,1.303,-24.884,-14.933],
// 2 24 -1.35 -15.945 -14.223 -1.303 -24.884 -14.933
  [2,24,-1.35,-15.945,-14.223,-1.303,-24.884,-14.933],
// 2 24 1.35 -15.945 -14.223 1.303 -24.884 -14.933
  [2,24,1.35,-15.945,-14.223,1.303,-24.884,-14.933],
// 2 24 -1.423 -10.386 -12.955 -1.35 -15.945 -14.223
  [2,24,-1.423,-10.386,-12.955,-1.35,-15.945,-14.223],
// 2 24 1.423 -10.386 -12.955 1.35 -15.945 -14.223
  [2,24,1.423,-10.386,-12.955,1.35,-15.945,-14.223],
// 2 24 -1.582 -9.392 -12.042 -1.423 -10.386 -12.955
  [2,24,-1.582,-9.392,-12.042,-1.423,-10.386,-12.955],
// 2 24 1.582 -9.392 -12.042 1.423 -10.386 -12.955
  [2,24,1.582,-9.392,-12.042,1.423,-10.386,-12.955],
// 2 24 -1.869 -9 -10.709 -1.582 -9.392 -12.042
  [2,24,-1.869,-9,-10.709,-1.582,-9.392,-12.042],
// 2 24 1.869 -9 -10.709 1.582 -9.392 -12.042
  [2,24,1.869,-9,-10.709,1.582,-9.392,-12.042],
// 2 24 -2.493 -9 -7.974 -1.869 -9 -10.709
  [2,24,-2.493,-9,-7.974,-1.869,-9,-10.709],
// 2 24 2.493 -9 -7.974 1.869 -9 -10.709
  [2,24,2.493,-9,-7.974,1.869,-9,-10.709],
// 2 24 -2.49588 -9 -3.05063 -2.493 -9 -7.974
  [2,24,-2.49588,-9,-3.05063,-2.493,-9,-7.974],
// 2 24 2.49588 -9 -3.05063 2.493 -9 -7.974
  [2,24,2.49588,-9,-3.05063,2.493,-9,-7.974],
// 
// 0 // Added lines/Condlines
// 5 24 -2.493 -9 -7.974 -2.491 -15.904 -9.316 -2.5 -17.585 4.77 -1.869 -9 -10.709
  [5,24,-2.493,-9,-7.974,-2.491,-15.904,-9.316,-2.5,-17.585,4.77,-1.869,-9,-10.709],
// 5 24 -1.35 -15.945 -14.223 -2.491 -15.904 -9.316 -1.423 -10.386 -12.955 -2.492 -26.41 -9.838
  [5,24,-1.35,-15.945,-14.223,-2.491,-15.904,-9.316,-1.423,-10.386,-12.955,-2.492,-26.41,-9.838],
// 5 24 -2.491 -15.904 -9.316 -1.423 -10.386 -12.955 -1.35 -15.945 -14.223 -1.582 -9.392 -12.042
  [5,24,-2.491,-15.904,-9.316,-1.423,-10.386,-12.955,-1.35,-15.945,-14.223,-1.582,-9.392,-12.042],
// 5 24 -1.582 -9.392 -12.042 -2.491 -15.904 -9.316 -2.493 -9 -7.974 -1.423 -10.386 -12.955
  [5,24,-1.582,-9.392,-12.042,-2.491,-15.904,-9.316,-2.493,-9,-7.974,-1.423,-10.386,-12.955],
// 5 24 -2.492 -26.41 -9.838 -2.491 -15.904 -9.316 -1.35 -15.945 -14.223 -2.5 -25.441 5.748
  [5,24,-2.492,-26.41,-9.838,-2.491,-15.904,-9.316,-1.35,-15.945,-14.223,-2.5,-25.441,5.748],
// 5 24 -1.303 -24.884 -14.933 -2.492 -26.41 -9.838 -2.491 -15.904 -9.316 -2.492 -36.994 -8.552
  [5,24,-1.303,-24.884,-14.933,-2.492,-26.41,-9.838,-2.491,-15.904,-9.316,-2.492,-36.994,-8.552],
// 5 24 -2.492 -36.994 -8.552 -2.492 -26.41 -9.838 -1.303 -24.884 -14.933 -2.5 -34.894 6.439
  [5,24,-2.492,-36.994,-8.552,-2.492,-26.41,-9.838,-1.303,-24.884,-14.933,-2.5,-34.894,6.439],
// 5 24 -1.29 -35.381 -14.011 -2.492 -36.994 -8.552 -2.492 -26.41 -9.838 -1.627 -36.988 -12.268
  [5,24,-1.29,-35.381,-14.011,-2.492,-36.994,-8.552,-2.492,-26.41,-9.838,-1.627,-36.988,-12.268],
// 5 24 2.491 -15.904 -9.316 2.493 -9 -7.974 2.5 -17.585 4.77 1.869 -9 -10.709
  [5,24,2.491,-15.904,-9.316,2.493,-9,-7.974,2.5,-17.585,4.77,1.869,-9,-10.709],
// 5 24 2.491 -15.904 -9.316 1.35 -15.945 -14.223 1.423 -10.386 -12.955 2.492 -26.41 -9.838
  [5,24,2.491,-15.904,-9.316,1.35,-15.945,-14.223,1.423,-10.386,-12.955,2.492,-26.41,-9.838],
// 5 24 1.423 -10.386 -12.955 2.491 -15.904 -9.316 1.35 -15.945 -14.223 1.582 -9.392 -12.042
  [5,24,1.423,-10.386,-12.955,2.491,-15.904,-9.316,1.35,-15.945,-14.223,1.582,-9.392,-12.042],
// 5 24 2.491 -15.904 -9.316 1.582 -9.392 -12.042 1.869 -9 -10.709 1.423 -10.386 -12.955
  [5,24,2.491,-15.904,-9.316,1.582,-9.392,-12.042,1.869,-9,-10.709,1.423,-10.386,-12.955],
// 5 24 2.491 -15.904 -9.316 2.492 -26.41 -9.838 1.35 -15.945 -14.223 2.5 -25.441 5.748
  [5,24,2.491,-15.904,-9.316,2.492,-26.41,-9.838,1.35,-15.945,-14.223,2.5,-25.441,5.748],
// 5 24 2.492 -26.41 -9.838 1.303 -24.884 -14.933 1.35 -15.945 -14.223 2.492 -36.994 -8.552
  [5,24,2.492,-26.41,-9.838,1.303,-24.884,-14.933,1.35,-15.945,-14.223,2.492,-36.994,-8.552],
// 5 24 2.492 -26.41 -9.838 2.492 -36.994 -8.552 1.303 -24.884 -14.933 2.5 -34.894 6.439
  [5,24,2.492,-26.41,-9.838,2.492,-36.994,-8.552,1.303,-24.884,-14.933,2.5,-34.894,6.439],
// 5 24 2.492 -36.994 -8.552 1.29 -35.381 -14.011 1.303 -24.884 -14.933 1.973 -37.25 -10.731
  [5,24,2.492,-36.994,-8.552,1.29,-35.381,-14.011,1.303,-24.884,-14.933,1.973,-37.25,-10.731],
// 5 24 2.5 -34.894 6.439 -2.5 -34.894 6.439 -2.492 -36.994 -8.552 2.5 -34.573 7.144
  [5,24,2.5,-34.894,6.439,-2.5,-34.894,6.439,-2.492,-36.994,-8.552,2.5,-34.573,7.144],
// 5 24 -2.492 -36.994 -8.552 2.492 -36.994 -8.552 2.5 -34.894 6.439 -1.973 -37.25 -10.731
  [5,24,-2.492,-36.994,-8.552,2.492,-36.994,-8.552,2.5,-34.894,6.439,-1.973,-37.25,-10.731],
// 5 24 -1.973 -37.25 -10.731 1.973 -37.25 -10.731 2.492 -36.994 -8.552 -1.627 -36.988 -12.268
  [5,24,-1.973,-37.25,-10.731,1.973,-37.25,-10.731,2.492,-36.994,-8.552,-1.627,-36.988,-12.268],
// 5 24 -1.627 -36.988 -12.268 1.627 -36.988 -12.268 1.973 -37.25 -10.731 -1.29 -35.381 -14.011
  [5,24,-1.627,-36.988,-12.268,1.627,-36.988,-12.268,1.973,-37.25,-10.731,-1.29,-35.381,-14.011],
// 5 24 2.5 -34.573 7.144 -2.5 -34.573 7.144 -2.5 -34.894 6.439 2.5 -33.148 7.564
  [5,24,2.5,-34.573,7.144,-2.5,-34.573,7.144,-2.5,-34.894,6.439,2.5,-33.148,7.564],
// 5 24 2.5 -33.148 7.564 -2.5 -33.148 7.564 -2.5 -34.573 7.144 2.5 -25.441 5.748
  [5,24,2.5,-33.148,7.564,-2.5,-33.148,7.564,-2.5,-34.573,7.144,2.5,-25.441,5.748],
// 5 24 -1.35 -15.945 -14.223 1.35 -15.945 -14.223 1.303 -24.884 -14.933 -1.423 -10.386 -12.955
  [5,24,-1.35,-15.945,-14.223,1.35,-15.945,-14.223,1.303,-24.884,-14.933,-1.423,-10.386,-12.955],
// 5 24 1.303 -24.884 -14.933 -1.303 -24.884 -14.933 -1.35 -15.945 -14.223 1.29 -35.381 -14.011
  [5,24,1.303,-24.884,-14.933,-1.303,-24.884,-14.933,-1.35,-15.945,-14.223,1.29,-35.381,-14.011],
// 5 24 -1.423 -10.386 -12.955 1.423 -10.386 -12.955 1.35 -15.945 -14.223 -1.582 -9.392 -12.042
  [5,24,-1.423,-10.386,-12.955,1.423,-10.386,-12.955,1.35,-15.945,-14.223,-1.582,-9.392,-12.042],
// 5 24 1.582 -9.392 -12.042 -1.582 -9.392 -12.042 -1.869 -9 -10.709 1.423 -10.386 -12.955
  [5,24,1.582,-9.392,-12.042,-1.582,-9.392,-12.042,-1.869,-9,-10.709,1.423,-10.386,-12.955],
// 5 24 -1.869 -9 -10.709 1.869 -9 -10.709 1.582 -9.392 -12.042 -2.493 -9 -7.974
  [5,24,-1.869,-9,-10.709,1.869,-9,-10.709,1.582,-9.392,-12.042,-2.493,-9,-7.974],
// 5 24 -2.5 -17.585 4.77 2.5 -17.585 4.77 2.5 -9.647 4.634 -2.5 -25.441 5.748
  [5,24,-2.5,-17.585,4.77,2.5,-17.585,4.77,2.5,-9.647,4.634,-2.5,-25.441,5.748],
// 5 24 -2.5 -25.441 5.748 2.5 -25.441 5.748 2.5 -17.585 4.77 -2.5 -33.148 7.564
  [5,24,-2.5,-25.441,5.748,2.5,-25.441,5.748,2.5,-17.585,4.77,-2.5,-33.148,7.564],
// 5 24 -2.5 -9 4.01 2.5 -9 4.01 2.493 -9 -7.974 -2.5 -9.647 4.634
  [5,24,-2.5,-9,4.01,2.5,-9,4.01,2.493,-9,-7.974,-2.5,-9.647,4.634],
];
makepoly(ldraw_lib__98369(), line=0.2);
